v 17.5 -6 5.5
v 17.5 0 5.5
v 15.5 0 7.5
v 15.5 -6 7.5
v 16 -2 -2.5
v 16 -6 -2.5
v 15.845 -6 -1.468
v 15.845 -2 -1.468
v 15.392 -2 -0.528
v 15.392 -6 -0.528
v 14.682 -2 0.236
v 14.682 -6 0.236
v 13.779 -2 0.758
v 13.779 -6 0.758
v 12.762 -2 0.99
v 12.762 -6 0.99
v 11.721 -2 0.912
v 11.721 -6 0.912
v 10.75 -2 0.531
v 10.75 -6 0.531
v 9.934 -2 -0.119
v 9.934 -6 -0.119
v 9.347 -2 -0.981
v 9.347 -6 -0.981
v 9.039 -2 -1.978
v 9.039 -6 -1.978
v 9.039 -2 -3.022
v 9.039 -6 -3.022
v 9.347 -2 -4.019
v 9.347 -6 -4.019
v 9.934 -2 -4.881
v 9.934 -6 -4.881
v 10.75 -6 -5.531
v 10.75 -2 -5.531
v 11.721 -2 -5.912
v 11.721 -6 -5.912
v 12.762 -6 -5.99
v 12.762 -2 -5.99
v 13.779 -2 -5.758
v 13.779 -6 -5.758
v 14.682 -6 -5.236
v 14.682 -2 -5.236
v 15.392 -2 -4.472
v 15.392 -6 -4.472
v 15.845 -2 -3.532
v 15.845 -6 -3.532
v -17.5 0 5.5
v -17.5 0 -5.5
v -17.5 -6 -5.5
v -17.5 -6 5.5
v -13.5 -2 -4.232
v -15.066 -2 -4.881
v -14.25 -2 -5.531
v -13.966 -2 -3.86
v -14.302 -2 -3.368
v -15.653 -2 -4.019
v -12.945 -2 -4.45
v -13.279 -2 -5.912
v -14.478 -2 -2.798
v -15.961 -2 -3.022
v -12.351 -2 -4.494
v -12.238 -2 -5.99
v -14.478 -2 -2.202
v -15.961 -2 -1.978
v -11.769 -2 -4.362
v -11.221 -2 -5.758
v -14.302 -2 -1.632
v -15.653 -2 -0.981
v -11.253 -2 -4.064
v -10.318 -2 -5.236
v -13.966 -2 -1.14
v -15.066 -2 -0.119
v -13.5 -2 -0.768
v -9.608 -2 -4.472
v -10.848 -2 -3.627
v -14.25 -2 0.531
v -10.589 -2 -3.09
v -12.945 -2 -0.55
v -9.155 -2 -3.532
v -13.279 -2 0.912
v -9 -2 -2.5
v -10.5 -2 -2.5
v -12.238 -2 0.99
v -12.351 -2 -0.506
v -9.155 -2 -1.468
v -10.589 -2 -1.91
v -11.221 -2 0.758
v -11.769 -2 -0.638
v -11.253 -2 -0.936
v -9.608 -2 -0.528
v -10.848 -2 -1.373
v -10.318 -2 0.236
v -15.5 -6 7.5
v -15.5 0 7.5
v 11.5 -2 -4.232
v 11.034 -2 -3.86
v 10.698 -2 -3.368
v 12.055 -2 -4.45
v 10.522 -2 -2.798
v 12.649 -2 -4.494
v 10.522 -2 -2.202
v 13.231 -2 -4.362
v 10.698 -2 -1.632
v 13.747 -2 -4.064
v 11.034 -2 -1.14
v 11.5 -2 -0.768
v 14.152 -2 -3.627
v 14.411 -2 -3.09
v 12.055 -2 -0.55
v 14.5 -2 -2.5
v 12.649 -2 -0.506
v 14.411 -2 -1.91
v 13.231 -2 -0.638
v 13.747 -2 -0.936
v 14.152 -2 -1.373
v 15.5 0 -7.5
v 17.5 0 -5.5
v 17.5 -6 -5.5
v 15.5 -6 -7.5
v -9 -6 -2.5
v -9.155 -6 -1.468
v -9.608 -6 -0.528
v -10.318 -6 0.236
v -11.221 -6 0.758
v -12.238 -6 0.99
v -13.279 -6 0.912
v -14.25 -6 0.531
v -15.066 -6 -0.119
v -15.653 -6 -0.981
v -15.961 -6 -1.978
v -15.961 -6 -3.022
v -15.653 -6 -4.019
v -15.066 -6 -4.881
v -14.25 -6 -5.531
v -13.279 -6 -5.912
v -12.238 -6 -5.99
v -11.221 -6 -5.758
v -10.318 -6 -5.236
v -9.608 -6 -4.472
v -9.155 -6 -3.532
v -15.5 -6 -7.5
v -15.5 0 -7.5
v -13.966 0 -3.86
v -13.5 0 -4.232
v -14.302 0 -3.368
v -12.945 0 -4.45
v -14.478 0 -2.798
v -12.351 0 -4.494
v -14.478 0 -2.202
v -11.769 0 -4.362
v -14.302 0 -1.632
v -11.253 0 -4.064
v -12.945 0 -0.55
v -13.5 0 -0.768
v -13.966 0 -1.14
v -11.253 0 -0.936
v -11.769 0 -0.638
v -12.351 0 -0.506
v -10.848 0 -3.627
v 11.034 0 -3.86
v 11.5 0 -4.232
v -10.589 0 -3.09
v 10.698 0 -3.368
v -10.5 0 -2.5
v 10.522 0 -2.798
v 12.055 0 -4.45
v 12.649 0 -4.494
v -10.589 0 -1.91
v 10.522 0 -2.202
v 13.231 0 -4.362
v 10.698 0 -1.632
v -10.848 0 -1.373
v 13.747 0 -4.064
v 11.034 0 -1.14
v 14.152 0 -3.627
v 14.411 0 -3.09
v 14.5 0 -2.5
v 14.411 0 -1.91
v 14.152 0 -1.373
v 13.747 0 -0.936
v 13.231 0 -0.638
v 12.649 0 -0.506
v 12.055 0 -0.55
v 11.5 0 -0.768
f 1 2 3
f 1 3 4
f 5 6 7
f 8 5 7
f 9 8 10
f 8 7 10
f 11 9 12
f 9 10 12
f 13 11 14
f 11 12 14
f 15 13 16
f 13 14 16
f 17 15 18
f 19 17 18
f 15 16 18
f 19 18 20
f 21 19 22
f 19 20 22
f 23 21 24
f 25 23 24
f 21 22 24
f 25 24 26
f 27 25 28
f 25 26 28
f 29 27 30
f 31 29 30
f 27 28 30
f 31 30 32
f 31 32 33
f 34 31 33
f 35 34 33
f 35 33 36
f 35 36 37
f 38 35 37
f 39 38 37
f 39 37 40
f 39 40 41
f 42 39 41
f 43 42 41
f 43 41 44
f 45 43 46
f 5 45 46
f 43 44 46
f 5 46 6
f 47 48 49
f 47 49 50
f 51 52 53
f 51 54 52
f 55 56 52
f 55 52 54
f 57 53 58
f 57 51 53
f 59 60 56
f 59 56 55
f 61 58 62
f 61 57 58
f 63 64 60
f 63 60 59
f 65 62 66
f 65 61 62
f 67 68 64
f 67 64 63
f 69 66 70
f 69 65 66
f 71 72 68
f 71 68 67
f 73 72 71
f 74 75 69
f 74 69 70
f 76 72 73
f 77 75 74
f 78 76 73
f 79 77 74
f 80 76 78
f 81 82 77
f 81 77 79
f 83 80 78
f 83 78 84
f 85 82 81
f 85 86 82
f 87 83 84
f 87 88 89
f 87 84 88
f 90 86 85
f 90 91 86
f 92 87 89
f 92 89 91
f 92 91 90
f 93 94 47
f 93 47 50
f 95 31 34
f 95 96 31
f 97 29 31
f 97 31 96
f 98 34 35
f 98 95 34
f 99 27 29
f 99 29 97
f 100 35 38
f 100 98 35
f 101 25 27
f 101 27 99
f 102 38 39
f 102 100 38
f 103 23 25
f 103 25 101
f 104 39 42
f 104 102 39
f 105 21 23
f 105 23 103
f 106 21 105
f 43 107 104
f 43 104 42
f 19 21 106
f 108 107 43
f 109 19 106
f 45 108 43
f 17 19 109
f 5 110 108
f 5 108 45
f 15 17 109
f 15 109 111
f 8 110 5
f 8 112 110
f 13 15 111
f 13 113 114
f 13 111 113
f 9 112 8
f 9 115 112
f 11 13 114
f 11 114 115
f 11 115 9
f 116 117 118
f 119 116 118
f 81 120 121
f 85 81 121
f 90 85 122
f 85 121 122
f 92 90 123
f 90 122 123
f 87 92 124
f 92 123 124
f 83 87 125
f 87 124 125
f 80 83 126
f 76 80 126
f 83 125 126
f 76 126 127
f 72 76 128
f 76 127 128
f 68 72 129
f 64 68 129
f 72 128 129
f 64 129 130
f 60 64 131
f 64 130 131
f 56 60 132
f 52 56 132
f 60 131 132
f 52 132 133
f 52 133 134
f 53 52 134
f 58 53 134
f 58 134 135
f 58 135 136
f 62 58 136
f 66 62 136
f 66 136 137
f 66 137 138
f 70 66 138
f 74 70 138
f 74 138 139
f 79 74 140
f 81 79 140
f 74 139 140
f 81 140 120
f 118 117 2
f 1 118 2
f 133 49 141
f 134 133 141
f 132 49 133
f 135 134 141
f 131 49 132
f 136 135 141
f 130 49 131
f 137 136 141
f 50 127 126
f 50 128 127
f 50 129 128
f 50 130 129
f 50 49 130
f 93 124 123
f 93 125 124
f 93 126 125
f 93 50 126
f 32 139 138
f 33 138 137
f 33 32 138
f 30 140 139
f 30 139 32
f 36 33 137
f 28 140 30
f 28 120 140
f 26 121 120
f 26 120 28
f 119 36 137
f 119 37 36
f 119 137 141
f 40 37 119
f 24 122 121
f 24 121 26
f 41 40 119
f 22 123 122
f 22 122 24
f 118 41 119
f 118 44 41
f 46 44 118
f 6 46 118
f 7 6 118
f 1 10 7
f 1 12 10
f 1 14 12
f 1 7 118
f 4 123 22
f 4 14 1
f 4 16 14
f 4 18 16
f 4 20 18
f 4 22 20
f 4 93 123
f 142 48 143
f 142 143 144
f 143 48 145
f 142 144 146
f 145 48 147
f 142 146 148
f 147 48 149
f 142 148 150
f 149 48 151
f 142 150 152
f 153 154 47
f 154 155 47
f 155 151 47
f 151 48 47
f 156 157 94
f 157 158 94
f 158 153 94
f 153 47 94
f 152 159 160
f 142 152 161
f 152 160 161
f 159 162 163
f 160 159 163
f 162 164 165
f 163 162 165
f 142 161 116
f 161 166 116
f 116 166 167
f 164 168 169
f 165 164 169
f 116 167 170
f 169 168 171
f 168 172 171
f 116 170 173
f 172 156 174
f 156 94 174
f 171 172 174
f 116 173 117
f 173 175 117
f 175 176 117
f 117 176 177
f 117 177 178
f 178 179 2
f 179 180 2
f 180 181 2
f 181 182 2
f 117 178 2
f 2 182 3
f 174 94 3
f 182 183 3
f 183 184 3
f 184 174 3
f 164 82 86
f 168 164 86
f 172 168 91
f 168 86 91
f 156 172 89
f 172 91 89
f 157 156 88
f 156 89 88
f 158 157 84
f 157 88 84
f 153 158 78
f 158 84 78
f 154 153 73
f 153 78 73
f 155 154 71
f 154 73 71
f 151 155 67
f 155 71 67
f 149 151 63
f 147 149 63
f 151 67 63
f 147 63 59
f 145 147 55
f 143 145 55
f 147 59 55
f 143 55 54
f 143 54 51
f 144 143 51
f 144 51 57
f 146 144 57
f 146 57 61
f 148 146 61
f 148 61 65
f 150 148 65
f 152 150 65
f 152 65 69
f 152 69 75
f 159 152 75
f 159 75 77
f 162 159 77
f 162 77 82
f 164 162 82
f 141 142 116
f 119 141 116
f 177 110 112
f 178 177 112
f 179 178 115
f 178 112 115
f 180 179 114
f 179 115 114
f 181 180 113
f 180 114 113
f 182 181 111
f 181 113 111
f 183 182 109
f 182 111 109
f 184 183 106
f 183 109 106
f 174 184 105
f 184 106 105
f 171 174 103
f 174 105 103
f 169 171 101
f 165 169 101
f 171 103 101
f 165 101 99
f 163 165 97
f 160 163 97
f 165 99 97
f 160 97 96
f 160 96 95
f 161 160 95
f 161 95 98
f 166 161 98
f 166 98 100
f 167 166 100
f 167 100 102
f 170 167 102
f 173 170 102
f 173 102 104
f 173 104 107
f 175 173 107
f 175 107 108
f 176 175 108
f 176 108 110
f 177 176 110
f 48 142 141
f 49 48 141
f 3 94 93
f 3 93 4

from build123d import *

# Parameters (mm, degrees)
F0_W     = 35
F0_H     = 15
F1_DEPTH = 6
F2_R     = 3.5
F3_DEPTH = 4
F4_R     = 2
F5_DEPTH = 6.001
F6_SIZE  = 2


with BuildPart() as f1:
    # F0 (on Front) → F1 (new body)
    with BuildSketch(Plane.XZ):
        Rectangle(F0_W, F0_H)
    extrude(amount=F1_DEPTH)

    # F2 (on face) → F3 (cut)
    with BuildSketch(Plane.XZ.offset(6)):
        with Locations((12.5, -2.5)):
            Circle(F2_R)
        with Locations((-12.5, -2.5)):
            Circle(F2_R)
    extrude(amount=-F3_DEPTH, mode=Mode.SUBTRACT)

    # F4 (on face) → F5 (cut, through all)
    with BuildSketch(Plane.XZ.offset(6)):
        with Locations((12.5, -2.5)):
            Circle(F4_R)
        with Locations((-12.5, -2.5)):
            Circle(F4_R)
    extrude(amount=-F5_DEPTH, mode=Mode.SUBTRACT)

    # F6
    f6_edges = [f1.edges().sort_by_distance(p)[0] for p in [
        (-17.5, -3, 7.5),
        (17.5, -3, 7.5),
        (17.5, -3, -7.5),
        (-17.5, -3, -7.5),
    ]]
    chamfer(f6_edges, length=F6_SIZE)


solid = f1.part
